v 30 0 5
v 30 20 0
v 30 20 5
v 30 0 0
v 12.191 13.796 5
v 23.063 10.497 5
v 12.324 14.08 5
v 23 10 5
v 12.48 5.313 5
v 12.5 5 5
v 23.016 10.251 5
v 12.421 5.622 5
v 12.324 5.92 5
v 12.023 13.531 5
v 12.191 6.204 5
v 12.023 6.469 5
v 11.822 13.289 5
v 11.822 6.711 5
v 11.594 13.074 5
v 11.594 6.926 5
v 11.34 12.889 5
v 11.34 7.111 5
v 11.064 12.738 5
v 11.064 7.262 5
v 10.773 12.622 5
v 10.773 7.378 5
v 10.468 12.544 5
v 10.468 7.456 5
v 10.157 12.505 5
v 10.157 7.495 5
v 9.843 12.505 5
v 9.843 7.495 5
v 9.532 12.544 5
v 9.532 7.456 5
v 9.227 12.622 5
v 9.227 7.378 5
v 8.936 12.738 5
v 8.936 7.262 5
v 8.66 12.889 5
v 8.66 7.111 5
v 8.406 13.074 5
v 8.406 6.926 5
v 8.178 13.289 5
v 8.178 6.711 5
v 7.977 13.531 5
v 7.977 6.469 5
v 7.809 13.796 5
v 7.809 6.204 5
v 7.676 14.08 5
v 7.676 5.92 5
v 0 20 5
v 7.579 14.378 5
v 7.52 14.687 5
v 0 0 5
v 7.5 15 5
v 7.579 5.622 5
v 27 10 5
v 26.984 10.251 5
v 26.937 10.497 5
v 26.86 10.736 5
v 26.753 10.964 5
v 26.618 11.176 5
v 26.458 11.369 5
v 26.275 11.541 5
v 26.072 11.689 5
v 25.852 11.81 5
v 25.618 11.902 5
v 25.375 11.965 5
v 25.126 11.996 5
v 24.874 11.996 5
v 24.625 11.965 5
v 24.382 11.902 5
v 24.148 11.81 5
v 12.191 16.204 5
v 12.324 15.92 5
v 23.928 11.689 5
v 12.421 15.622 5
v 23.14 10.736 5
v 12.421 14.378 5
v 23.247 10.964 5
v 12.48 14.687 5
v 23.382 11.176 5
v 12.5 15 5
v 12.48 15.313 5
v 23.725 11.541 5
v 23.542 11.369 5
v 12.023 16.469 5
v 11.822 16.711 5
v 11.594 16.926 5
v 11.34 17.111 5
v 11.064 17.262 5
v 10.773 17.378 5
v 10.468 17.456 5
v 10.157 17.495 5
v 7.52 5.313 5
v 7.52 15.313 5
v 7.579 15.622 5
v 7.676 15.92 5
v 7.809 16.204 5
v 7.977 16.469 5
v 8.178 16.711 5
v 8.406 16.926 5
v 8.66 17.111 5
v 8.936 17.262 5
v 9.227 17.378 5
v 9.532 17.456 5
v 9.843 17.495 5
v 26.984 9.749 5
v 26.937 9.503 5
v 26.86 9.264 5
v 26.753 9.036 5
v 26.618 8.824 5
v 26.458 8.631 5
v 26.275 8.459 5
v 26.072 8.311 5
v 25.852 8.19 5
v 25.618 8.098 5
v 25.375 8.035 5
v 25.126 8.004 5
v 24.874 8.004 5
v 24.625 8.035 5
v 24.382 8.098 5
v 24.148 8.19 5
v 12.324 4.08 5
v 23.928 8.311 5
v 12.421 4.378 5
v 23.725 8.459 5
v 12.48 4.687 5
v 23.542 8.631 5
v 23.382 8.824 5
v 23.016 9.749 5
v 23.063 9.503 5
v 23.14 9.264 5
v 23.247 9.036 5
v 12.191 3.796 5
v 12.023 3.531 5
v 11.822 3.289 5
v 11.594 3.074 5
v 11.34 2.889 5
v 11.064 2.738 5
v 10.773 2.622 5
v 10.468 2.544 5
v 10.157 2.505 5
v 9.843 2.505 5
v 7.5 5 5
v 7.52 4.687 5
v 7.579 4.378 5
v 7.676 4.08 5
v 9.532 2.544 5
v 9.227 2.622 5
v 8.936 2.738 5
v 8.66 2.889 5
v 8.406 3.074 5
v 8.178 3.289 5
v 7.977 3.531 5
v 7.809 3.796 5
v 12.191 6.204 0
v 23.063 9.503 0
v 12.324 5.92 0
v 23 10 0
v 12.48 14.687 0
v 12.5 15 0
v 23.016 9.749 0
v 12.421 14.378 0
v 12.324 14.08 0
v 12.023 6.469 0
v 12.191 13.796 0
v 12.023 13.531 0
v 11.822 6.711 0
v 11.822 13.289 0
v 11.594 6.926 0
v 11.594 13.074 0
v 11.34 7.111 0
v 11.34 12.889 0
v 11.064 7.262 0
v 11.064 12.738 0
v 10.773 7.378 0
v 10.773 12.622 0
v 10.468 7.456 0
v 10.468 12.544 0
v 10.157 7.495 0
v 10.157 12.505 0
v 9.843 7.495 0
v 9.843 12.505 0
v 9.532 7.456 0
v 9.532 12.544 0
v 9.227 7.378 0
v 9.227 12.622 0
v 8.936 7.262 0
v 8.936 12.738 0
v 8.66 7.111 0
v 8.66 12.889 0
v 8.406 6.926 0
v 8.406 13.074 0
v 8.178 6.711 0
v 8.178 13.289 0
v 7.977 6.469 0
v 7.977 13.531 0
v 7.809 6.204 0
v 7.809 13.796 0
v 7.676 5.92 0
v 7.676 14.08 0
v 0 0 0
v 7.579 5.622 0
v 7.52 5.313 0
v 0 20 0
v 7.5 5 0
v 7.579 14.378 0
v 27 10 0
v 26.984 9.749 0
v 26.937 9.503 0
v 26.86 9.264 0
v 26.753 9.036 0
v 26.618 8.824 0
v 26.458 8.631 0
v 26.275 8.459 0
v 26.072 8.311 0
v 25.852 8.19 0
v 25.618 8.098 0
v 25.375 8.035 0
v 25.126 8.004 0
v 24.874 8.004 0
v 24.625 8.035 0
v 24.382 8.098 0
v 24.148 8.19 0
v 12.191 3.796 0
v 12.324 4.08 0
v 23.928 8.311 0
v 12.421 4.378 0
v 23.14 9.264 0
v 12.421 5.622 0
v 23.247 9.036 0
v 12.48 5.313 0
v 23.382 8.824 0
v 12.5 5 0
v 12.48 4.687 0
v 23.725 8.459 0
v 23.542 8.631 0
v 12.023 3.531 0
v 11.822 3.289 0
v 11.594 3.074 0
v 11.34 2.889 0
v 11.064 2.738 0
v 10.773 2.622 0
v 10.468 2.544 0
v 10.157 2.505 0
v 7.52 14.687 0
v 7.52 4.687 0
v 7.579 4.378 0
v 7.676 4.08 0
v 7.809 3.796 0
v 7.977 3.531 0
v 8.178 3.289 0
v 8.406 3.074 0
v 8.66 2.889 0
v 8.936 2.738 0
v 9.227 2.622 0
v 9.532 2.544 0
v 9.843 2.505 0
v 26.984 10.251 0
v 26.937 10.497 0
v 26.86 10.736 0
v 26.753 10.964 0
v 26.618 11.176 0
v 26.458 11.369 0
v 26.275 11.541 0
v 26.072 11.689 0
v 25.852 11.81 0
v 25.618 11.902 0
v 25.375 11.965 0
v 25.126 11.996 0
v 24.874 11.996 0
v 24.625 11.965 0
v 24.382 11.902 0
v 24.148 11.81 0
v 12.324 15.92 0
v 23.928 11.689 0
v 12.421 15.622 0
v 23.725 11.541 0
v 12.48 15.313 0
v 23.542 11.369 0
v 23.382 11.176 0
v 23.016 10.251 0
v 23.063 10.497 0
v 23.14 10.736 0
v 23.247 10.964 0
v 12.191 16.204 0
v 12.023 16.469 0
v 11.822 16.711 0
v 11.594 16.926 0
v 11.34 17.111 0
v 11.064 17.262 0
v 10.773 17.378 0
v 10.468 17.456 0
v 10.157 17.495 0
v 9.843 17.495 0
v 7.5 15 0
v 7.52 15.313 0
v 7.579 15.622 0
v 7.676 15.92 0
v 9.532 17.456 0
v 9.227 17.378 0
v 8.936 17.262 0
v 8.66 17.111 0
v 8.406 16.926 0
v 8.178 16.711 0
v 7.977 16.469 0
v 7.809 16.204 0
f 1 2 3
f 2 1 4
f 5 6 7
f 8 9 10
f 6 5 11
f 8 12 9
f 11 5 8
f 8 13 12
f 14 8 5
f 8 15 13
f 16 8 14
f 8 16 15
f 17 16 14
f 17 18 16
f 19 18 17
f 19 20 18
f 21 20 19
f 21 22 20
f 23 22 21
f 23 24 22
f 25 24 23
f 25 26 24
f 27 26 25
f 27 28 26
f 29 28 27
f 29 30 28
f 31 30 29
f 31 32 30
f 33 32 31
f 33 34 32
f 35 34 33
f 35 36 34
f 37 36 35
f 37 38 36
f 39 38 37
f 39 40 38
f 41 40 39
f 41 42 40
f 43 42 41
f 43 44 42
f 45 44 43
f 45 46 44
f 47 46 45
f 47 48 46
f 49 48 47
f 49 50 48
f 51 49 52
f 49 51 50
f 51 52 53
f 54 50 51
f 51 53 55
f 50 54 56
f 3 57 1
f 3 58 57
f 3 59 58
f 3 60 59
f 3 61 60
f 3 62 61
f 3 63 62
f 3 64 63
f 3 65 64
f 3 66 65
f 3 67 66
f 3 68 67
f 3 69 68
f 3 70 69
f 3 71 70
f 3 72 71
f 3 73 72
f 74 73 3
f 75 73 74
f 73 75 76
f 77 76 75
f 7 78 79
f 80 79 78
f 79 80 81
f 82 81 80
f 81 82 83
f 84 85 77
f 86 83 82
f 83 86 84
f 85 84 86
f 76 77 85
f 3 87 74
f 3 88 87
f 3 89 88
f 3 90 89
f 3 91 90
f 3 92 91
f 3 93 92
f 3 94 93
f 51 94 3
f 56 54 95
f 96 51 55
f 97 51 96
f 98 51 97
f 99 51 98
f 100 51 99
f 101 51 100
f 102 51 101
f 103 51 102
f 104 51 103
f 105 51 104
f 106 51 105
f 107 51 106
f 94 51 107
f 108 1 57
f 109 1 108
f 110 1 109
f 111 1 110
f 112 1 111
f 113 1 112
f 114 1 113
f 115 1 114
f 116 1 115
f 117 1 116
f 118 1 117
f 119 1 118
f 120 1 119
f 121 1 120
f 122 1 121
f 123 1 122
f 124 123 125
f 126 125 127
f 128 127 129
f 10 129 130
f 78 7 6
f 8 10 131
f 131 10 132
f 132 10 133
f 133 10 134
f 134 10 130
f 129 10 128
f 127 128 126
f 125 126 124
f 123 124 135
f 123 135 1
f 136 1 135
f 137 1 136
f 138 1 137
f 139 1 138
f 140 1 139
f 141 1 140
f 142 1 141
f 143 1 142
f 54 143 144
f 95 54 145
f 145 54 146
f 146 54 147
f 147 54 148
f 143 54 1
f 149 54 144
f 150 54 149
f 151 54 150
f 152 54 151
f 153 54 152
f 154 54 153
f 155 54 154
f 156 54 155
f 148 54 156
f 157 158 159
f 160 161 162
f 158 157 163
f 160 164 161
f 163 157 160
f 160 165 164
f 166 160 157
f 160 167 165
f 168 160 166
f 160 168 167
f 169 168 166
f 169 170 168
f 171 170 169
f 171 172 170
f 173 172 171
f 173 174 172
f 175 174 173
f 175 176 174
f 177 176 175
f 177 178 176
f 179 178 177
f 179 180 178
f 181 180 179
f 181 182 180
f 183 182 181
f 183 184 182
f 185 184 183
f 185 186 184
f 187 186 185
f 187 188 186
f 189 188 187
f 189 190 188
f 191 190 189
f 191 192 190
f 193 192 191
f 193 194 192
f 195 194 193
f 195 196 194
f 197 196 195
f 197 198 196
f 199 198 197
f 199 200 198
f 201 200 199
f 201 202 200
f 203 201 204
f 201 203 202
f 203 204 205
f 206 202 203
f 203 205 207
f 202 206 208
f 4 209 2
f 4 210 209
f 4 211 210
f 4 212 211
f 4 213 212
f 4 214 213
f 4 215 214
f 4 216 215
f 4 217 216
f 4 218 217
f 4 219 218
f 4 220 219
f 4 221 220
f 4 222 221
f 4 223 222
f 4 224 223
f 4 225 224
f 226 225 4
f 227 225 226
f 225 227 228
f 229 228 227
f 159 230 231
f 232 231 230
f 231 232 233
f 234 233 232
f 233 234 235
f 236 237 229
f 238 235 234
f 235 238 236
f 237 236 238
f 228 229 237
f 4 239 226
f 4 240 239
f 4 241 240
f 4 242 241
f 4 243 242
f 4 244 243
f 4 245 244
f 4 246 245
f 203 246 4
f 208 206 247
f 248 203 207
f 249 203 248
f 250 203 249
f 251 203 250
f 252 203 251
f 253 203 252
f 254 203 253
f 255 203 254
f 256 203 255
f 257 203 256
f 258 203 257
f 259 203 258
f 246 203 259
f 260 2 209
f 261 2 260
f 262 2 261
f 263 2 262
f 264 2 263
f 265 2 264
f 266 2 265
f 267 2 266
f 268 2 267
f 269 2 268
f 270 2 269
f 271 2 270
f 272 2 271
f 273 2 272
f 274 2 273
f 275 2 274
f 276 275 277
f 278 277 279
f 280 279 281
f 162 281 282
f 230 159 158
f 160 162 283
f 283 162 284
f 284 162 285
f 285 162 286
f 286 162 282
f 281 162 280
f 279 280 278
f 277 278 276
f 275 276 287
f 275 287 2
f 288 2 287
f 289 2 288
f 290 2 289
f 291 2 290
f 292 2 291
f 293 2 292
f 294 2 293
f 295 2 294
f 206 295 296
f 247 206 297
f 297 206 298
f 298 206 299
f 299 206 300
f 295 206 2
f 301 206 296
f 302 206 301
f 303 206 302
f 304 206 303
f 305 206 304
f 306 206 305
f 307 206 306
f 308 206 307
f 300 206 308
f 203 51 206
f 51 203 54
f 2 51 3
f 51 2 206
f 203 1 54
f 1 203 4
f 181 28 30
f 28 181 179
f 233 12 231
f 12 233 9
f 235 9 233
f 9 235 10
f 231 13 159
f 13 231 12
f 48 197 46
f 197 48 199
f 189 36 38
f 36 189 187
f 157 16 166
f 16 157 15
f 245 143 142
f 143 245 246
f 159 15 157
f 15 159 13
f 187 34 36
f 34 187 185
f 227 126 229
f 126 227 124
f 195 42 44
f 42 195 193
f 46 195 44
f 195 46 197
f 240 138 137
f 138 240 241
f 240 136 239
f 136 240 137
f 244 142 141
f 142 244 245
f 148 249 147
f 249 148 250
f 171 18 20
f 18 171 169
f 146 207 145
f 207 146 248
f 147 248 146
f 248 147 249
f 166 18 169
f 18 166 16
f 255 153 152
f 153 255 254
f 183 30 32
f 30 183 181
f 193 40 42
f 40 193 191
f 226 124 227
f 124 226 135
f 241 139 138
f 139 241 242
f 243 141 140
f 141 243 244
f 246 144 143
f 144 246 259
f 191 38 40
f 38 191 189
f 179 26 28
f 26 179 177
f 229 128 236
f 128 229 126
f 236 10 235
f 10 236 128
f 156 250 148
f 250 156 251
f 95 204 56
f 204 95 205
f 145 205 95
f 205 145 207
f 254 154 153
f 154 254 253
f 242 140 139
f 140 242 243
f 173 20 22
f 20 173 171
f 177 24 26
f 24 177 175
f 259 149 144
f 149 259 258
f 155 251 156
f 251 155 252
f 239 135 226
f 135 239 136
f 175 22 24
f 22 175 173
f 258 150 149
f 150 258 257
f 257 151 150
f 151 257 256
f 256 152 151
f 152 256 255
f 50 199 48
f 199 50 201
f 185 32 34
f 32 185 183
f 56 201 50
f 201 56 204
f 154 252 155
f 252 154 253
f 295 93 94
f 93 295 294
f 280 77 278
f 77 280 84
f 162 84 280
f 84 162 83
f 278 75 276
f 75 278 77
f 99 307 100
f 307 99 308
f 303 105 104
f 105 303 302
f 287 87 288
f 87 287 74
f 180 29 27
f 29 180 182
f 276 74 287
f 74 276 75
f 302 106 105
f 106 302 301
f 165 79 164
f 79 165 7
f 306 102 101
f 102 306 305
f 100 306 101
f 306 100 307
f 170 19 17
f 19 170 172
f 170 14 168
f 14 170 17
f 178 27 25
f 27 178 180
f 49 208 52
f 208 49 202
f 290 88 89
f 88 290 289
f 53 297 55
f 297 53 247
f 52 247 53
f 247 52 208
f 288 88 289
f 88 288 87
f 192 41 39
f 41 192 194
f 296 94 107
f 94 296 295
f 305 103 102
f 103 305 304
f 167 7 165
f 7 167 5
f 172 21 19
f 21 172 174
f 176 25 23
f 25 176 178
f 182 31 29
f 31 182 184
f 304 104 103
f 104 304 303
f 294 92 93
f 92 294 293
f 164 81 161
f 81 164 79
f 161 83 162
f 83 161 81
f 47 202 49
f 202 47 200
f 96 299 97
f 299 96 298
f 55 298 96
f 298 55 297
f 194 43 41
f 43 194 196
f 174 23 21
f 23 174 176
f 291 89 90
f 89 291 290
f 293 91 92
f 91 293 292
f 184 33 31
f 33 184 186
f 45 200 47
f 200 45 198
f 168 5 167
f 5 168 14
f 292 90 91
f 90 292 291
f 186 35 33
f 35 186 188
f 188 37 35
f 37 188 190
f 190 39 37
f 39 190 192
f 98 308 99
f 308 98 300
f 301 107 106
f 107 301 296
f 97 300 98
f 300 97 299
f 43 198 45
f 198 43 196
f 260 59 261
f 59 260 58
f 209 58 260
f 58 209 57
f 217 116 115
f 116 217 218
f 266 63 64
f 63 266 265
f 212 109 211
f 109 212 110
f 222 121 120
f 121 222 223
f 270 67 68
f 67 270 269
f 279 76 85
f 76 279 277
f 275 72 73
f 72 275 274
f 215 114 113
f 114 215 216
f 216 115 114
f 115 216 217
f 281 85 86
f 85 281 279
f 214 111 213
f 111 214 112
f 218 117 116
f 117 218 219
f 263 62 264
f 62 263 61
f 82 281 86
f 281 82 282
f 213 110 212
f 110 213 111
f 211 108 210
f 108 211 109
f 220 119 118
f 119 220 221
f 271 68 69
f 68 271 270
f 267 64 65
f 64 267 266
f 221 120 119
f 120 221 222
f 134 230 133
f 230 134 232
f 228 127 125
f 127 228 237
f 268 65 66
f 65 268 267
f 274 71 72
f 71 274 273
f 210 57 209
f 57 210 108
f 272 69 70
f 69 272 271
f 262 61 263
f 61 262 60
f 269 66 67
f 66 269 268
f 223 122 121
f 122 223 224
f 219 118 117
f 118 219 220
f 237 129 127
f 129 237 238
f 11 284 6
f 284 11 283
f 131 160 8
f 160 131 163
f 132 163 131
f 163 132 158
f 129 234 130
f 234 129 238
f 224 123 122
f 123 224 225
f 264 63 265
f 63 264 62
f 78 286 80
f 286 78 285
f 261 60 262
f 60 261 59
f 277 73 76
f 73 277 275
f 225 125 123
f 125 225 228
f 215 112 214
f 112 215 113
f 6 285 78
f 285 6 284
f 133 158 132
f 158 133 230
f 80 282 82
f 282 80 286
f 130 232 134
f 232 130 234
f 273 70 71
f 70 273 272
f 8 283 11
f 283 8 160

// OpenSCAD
extrusion_size=20;
hole_size_for_extrusion=5;
hole_size_for_shock_absorber=4;
thickness=5;
length=20;

extra=10;
$fn=50;

difference(){
cube([extrusion_size+extra,length,thickness]);
translate([extrusion_size/2,5,0]) cylinder(r=hole_size_for_extrusion/2,h=20);
    
translate([extrusion_size/2,length-5,0]) cylinder(r=hole_size_for_extrusion/2,h=20);    
    
    translate([extrusion_size+extra/2,length/2,0]) cylinder(r=hole_size_for_shock_absorber/2,h=20);    
}
